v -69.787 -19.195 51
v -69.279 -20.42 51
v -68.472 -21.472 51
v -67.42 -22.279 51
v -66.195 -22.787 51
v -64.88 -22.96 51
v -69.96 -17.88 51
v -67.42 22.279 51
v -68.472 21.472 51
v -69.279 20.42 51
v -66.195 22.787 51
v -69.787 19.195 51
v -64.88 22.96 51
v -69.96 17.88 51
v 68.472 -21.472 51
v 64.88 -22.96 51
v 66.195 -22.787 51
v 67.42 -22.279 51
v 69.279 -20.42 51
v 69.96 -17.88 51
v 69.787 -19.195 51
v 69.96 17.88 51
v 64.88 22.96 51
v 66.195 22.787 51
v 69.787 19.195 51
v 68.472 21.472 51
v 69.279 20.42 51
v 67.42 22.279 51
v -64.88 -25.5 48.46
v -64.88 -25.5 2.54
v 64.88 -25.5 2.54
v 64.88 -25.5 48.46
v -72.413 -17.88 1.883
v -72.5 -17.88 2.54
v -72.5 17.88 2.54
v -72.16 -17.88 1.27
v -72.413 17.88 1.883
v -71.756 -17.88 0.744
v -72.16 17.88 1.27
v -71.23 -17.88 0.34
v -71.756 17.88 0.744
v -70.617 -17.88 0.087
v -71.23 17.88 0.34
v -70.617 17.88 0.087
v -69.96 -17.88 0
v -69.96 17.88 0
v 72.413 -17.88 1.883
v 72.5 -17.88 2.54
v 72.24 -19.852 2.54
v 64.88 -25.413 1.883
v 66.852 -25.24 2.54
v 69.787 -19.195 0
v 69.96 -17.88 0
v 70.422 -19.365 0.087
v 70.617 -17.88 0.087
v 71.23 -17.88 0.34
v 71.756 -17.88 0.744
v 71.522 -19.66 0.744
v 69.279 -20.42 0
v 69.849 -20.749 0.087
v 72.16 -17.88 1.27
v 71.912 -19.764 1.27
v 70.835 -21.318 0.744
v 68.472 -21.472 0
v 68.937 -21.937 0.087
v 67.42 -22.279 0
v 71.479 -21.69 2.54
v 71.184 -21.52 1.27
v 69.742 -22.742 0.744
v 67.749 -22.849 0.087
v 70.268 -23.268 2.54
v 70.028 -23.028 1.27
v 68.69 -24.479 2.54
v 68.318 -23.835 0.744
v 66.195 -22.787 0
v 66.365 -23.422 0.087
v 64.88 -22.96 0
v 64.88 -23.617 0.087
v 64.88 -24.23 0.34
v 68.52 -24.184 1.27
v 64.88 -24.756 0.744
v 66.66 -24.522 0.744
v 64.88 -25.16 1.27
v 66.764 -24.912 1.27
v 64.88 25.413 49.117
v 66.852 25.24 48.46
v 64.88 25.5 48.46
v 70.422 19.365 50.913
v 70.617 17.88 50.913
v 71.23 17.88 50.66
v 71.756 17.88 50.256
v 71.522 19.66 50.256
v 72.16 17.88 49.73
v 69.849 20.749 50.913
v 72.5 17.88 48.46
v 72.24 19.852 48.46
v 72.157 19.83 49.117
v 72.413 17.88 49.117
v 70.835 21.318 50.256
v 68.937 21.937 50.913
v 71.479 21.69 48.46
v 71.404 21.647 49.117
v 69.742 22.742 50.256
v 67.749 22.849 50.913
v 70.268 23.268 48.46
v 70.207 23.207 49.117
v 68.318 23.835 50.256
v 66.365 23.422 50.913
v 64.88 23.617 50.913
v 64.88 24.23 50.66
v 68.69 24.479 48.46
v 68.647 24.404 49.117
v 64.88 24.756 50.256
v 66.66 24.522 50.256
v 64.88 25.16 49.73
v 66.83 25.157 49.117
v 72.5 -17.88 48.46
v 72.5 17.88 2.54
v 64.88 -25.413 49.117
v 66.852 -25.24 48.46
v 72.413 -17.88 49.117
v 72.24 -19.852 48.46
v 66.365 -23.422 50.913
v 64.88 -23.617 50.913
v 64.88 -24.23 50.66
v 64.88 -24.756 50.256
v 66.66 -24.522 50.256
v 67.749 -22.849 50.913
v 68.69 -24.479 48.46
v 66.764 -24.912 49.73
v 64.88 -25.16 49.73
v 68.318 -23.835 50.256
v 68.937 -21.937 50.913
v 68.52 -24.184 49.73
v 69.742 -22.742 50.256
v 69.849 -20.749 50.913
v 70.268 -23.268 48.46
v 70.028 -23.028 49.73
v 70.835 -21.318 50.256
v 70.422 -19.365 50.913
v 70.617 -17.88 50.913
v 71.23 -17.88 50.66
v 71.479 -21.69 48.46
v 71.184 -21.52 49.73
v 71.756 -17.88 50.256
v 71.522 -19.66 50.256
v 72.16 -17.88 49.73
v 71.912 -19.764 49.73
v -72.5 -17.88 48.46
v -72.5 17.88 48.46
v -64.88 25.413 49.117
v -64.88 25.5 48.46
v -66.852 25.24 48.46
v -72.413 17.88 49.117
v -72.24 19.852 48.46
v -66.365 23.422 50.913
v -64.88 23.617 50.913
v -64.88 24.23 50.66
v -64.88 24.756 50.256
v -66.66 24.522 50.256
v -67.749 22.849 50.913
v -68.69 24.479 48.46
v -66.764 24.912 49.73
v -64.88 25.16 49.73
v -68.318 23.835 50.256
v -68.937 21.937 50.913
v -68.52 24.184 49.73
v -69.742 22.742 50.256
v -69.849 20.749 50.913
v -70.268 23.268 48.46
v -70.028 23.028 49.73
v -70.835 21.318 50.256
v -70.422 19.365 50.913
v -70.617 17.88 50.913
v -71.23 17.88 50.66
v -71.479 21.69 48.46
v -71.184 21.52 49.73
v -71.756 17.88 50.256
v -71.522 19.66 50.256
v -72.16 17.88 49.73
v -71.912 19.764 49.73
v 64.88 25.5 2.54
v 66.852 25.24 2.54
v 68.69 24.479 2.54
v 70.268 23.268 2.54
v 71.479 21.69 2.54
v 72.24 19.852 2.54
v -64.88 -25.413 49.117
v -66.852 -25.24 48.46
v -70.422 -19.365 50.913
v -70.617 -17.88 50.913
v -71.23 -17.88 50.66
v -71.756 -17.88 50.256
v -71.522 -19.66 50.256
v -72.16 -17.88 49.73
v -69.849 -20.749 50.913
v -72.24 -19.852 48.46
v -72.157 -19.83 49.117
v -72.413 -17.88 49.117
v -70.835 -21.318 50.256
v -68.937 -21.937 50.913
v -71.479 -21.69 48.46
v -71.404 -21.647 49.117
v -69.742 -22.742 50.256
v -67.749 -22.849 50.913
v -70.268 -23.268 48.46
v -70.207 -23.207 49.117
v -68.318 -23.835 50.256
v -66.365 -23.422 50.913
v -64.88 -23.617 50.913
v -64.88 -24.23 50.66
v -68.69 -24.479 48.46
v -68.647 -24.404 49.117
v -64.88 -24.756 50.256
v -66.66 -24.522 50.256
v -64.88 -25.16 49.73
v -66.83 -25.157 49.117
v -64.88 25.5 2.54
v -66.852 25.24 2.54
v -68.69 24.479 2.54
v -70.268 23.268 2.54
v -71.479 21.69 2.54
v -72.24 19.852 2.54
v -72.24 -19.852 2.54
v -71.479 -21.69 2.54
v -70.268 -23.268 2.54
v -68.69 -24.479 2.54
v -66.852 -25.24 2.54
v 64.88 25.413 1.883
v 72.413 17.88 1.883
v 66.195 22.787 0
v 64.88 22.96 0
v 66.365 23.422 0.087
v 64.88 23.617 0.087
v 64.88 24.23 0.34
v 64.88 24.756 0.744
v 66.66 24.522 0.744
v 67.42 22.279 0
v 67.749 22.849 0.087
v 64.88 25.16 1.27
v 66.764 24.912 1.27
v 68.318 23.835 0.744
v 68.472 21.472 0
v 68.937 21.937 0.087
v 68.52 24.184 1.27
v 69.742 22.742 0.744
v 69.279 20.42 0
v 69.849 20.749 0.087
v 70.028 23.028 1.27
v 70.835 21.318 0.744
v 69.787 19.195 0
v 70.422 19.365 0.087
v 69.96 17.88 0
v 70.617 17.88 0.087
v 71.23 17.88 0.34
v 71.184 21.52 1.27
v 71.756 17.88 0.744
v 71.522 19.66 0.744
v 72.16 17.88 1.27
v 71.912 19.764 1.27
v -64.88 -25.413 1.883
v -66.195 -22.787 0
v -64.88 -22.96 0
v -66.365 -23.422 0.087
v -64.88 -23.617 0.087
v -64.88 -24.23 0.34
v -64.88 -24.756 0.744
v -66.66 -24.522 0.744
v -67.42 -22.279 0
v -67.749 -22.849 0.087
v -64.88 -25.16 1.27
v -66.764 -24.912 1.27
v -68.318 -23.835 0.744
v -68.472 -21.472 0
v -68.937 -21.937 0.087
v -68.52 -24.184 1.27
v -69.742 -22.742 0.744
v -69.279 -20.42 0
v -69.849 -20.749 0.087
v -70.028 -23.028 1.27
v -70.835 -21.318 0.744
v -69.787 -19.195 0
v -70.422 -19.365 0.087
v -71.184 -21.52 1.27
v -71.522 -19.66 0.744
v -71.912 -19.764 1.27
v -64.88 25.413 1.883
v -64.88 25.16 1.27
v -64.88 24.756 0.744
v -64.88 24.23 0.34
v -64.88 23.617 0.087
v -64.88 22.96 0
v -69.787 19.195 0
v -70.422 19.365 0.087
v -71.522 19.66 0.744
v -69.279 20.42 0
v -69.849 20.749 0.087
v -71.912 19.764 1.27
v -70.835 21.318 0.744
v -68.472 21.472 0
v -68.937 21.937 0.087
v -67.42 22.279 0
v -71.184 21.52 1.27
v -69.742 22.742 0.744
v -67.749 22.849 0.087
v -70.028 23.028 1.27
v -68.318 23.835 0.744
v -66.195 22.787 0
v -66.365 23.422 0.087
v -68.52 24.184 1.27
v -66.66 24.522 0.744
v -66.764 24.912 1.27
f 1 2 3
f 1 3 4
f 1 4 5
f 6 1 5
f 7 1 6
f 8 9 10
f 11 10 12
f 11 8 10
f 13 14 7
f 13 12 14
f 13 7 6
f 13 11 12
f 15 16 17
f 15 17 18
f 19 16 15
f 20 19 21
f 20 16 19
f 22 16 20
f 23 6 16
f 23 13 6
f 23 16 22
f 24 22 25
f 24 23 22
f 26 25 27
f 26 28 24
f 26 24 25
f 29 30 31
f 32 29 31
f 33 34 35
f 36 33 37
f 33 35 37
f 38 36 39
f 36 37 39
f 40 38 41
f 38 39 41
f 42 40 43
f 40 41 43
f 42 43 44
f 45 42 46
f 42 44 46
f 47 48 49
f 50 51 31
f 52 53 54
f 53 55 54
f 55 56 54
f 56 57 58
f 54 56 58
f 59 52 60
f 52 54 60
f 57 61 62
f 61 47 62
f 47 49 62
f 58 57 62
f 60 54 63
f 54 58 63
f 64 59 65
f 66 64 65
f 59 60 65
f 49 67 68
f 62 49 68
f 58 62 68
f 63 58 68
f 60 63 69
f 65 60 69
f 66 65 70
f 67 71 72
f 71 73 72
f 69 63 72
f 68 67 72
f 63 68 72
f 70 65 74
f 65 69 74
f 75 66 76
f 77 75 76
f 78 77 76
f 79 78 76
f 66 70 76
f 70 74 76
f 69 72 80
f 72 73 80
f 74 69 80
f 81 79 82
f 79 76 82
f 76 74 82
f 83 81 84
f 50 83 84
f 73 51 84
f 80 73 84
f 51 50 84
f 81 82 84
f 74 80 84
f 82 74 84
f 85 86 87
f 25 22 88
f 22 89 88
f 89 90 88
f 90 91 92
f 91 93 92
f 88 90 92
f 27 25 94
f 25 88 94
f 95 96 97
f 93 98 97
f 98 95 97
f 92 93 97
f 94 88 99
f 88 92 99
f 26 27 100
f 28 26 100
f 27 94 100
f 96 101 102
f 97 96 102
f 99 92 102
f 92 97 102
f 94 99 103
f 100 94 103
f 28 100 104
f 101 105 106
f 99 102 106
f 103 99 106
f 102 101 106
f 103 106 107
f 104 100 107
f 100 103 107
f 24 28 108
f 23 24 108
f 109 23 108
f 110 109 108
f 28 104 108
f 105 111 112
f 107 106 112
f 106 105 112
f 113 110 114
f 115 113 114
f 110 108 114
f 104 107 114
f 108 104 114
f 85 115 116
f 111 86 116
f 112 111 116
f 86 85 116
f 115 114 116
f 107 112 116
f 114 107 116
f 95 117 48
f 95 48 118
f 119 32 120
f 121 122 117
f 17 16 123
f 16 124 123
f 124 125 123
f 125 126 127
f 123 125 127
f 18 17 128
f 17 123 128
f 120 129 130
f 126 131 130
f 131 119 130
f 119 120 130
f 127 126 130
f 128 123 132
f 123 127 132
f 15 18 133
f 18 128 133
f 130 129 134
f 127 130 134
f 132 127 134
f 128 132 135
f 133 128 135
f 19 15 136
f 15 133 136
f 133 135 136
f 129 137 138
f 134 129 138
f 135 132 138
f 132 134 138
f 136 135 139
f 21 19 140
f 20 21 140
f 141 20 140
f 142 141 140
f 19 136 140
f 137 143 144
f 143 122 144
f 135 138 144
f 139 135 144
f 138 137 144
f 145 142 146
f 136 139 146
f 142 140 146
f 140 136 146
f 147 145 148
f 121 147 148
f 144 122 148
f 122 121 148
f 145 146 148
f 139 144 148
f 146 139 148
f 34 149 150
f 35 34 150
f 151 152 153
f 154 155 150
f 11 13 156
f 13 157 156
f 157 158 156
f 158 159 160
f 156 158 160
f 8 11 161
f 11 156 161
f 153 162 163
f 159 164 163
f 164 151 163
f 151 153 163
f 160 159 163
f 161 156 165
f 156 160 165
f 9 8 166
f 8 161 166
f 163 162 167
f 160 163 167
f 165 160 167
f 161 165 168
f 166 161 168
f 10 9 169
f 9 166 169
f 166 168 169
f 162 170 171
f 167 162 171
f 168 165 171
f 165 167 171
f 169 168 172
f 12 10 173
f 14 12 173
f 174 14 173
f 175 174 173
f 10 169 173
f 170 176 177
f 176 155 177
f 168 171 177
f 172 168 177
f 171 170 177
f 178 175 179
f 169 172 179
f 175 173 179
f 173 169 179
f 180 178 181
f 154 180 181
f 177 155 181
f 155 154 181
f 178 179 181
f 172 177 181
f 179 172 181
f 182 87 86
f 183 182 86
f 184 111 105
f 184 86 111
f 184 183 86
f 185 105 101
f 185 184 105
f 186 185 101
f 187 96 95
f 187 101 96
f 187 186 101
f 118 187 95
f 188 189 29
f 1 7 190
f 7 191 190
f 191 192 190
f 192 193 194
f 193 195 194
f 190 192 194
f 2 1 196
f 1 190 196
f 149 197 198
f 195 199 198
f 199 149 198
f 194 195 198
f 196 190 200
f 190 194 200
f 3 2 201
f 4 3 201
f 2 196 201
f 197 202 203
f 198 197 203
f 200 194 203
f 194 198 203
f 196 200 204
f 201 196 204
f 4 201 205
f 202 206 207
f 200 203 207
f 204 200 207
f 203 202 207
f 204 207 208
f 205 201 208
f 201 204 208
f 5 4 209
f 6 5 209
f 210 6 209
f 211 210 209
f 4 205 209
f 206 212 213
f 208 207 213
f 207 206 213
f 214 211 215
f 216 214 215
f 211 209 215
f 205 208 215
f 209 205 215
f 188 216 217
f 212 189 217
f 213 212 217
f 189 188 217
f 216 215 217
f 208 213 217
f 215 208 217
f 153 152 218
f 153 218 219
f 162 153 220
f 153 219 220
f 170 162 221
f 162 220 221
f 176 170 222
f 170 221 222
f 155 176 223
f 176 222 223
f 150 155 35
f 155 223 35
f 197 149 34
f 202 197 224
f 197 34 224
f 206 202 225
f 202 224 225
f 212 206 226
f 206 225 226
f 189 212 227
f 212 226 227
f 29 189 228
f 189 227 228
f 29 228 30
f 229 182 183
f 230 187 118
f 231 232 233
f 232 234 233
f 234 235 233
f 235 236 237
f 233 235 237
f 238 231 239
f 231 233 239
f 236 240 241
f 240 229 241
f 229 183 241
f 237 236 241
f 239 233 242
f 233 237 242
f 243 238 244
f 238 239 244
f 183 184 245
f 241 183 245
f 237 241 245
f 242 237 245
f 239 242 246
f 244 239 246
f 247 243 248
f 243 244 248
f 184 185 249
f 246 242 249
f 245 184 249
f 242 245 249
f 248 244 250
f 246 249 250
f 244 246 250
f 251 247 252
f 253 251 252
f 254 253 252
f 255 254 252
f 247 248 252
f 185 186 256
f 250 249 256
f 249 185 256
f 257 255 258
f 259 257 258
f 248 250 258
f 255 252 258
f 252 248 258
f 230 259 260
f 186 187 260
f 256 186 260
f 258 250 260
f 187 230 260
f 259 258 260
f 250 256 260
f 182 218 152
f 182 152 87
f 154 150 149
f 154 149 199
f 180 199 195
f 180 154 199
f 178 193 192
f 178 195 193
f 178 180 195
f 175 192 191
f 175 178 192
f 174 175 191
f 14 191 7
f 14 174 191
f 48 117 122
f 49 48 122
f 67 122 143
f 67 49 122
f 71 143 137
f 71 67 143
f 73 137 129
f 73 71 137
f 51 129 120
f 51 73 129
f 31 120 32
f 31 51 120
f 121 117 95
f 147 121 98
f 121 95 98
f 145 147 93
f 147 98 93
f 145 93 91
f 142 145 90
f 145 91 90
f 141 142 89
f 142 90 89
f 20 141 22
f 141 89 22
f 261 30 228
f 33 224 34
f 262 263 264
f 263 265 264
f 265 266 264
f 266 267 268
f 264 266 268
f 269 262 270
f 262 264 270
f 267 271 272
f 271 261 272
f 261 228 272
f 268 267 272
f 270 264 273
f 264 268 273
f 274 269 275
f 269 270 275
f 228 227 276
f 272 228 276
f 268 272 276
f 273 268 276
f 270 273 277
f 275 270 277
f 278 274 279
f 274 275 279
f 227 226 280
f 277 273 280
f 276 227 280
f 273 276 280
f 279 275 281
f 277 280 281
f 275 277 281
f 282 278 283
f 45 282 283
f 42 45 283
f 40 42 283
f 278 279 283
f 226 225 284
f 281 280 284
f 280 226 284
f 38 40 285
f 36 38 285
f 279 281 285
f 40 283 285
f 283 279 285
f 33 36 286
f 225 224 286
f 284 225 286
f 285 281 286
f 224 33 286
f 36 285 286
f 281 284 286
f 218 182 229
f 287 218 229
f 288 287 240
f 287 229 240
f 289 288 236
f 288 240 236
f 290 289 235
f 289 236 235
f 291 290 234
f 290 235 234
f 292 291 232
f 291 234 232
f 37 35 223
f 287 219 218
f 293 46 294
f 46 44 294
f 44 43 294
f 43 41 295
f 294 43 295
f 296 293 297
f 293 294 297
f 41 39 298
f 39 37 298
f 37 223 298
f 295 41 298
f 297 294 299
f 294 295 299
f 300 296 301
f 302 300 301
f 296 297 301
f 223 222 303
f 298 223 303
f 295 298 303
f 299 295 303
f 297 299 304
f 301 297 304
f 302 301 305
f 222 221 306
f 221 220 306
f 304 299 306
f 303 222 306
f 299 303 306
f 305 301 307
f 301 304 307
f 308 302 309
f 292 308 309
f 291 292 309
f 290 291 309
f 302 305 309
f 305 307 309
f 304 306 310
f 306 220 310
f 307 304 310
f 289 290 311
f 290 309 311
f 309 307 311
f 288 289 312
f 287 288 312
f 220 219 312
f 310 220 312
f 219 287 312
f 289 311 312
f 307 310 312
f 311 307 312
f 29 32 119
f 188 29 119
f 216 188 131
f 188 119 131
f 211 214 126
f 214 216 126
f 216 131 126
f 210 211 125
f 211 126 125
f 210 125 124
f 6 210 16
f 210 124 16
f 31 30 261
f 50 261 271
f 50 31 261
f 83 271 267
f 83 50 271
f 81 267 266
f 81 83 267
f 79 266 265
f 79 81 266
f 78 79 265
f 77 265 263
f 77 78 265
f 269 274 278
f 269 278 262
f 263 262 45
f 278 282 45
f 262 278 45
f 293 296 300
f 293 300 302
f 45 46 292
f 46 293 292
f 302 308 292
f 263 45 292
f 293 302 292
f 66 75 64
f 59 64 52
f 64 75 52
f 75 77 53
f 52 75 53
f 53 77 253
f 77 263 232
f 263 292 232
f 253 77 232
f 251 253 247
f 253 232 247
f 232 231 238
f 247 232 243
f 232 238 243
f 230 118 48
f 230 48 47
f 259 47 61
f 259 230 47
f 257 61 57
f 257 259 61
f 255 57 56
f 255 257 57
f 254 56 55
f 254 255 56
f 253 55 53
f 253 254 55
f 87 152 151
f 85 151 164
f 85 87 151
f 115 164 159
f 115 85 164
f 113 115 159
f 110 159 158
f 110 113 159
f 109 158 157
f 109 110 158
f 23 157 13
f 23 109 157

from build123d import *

# Parameters (mm, degrees)
F0_W         = 145
F0_H         = 51
F1_DEPTH     = 51
F2_R         = 2.54
F3_T1_DEPTH  = 51
F3_T4_ANGLE  = 90
F3_T6_ANGLE  = 90
F3_T8_ANGLE  = 90
F3_T10_ANGLE = 90
F3_T12_ANGLE = 90
F3_T14_ANGLE = 90
F3_T16_ANGLE = 90
F3_T18_ANGLE = 90


# Not quite as in the source:
# - a fillet or chamfer that OpenCascade refuses, or shapes differently, is made with other operations: its cross-section is extruded or revolved along the edge and cut away or added


with BuildPart() as f1:
    # F0 (on Top) → F1 (new body)
    with BuildSketch(Plane.XY):
        Rectangle(F0_W, F0_H)
    extrude(amount=F1_DEPTH)

    # F2
    f2_edges = [f1.edges().sort_by_distance(p)[0] for p in [
        (0, -25.5, 51),
        (0, 25.5, 51),
        (0, -25.5, 0),
        (0, 25.5, 0),
        (-72.5, 0, 0),
        (-72.5, 0, 51),
        (72.5, 0, 0),
        (72.5, 0, 51),
    ]]
    fillet(f2_edges, radius=F2_R)

    # F3: fillet of radius 7.62 on 4 edges, made by hand

    # F3_s2 → F3_t1 (cut)
    with BuildSketch(Plane.XY):
        with BuildLine():
            ThreePointArc((72.5, -17.88), (70.2681536726, -23.2681536726), (64.88, -25.5))
            Line((64.88, -25.5), (72.5, -25.5))
            Line((72.5, -25.5), (72.5, -17.88))
        make_face()
        with BuildLine():
            ThreePointArc((64.88, 25.5), (70.2681536726, 23.2681536726), (72.5, 17.88))
            Line((72.5, 17.88), (72.5, 25.5))
            Line((72.5, 25.5), (64.88, 25.5))
        make_face()
        with BuildLine():
            ThreePointArc((-72.5, -17.88), (-70.2681536726, -23.2681536726), (-64.88, -25.5))
            Line((-64.88, -25.5), (-72.5, -25.5))
            Line((-72.5, -25.5), (-72.5, -17.88))
        make_face()
        with BuildLine():
            ThreePointArc((-64.88, 25.5), (-70.2681536726, 23.2681536726), (-72.5, 17.88))
            Line((-72.5, 17.88), (-72.5, 25.5))
            Line((-72.5, 25.5), (-64.88, 25.5))
        make_face()
    extrude(amount=F3_T1_DEPTH, mode=Mode.SUBTRACT)

    # F3_s3 → F3_t4 (revolve, cut)
    with BuildSketch(Plane.XZ.offset(-17.88)):
        with BuildLine():
            ThreePointArc((-69.96, 0), (-71.7560512242, 0.7439487758), (-72.5, 2.54))
            Line((-72.5, 2.54), (-72.5, 0))
            Line((-72.5, 0), (-69.96, 0))
        make_face()
    revolve(axis=Axis((-64.88, 17.88, 0), (0, 0, -1)), revolution_arc=F3_T4_ANGLE, mode=Mode.SUBTRACT)

    # F3_s5 → F3_t6 (revolve, cut)
    with BuildSketch(Plane.YZ.offset(-64.88)):
        with BuildLine():
            ThreePointArc((22.96, 51), (24.7560512242, 50.2560512242), (25.5, 48.46))
            Line((25.5, 48.46), (25.5, 51))
            Line((25.5, 51), (22.96, 51))
        make_face()
    revolve(axis=Axis((-64.88, 17.88, 51), (0, 0, 1)), revolution_arc=F3_T6_ANGLE, mode=Mode.SUBTRACT)

    # F3_s7 → F3_t8 (revolve, cut)
    with BuildSketch(Plane.YZ.offset(-64.88)):
        with BuildLine():
            ThreePointArc((-22.96, 0), (-24.7560512242, 0.7439487758), (-25.5, 2.54))
            Line((-25.5, 2.54), (-25.5, 0))
            Line((-25.5, 0), (-22.96, 0))
        make_face()
    revolve(axis=Axis((-64.88, -17.88, 0), (0, 0, -1)), revolution_arc=F3_T8_ANGLE, mode=Mode.SUBTRACT)

    # F3_s9 → F3_t10 (revolve, cut)
    with BuildSketch(Plane.XZ.offset(17.88)):
        with BuildLine():
            ThreePointArc((-69.96, 51), (-71.7560512242, 50.2560512242), (-72.5, 48.46))
            Line((-72.5, 48.46), (-72.5, 51))
            Line((-72.5, 51), (-69.96, 51))
        make_face()
    revolve(axis=Axis((-64.88, -17.88, 51), (0, 0, 1)), revolution_arc=F3_T10_ANGLE, mode=Mode.SUBTRACT)

    # F3_s11 → F3_t12 (revolve, cut)
    with BuildSketch(Plane.YZ.offset(64.88)):
        with BuildLine():
            ThreePointArc((22.96, 0), (24.7560512242, 0.7439487758), (25.5, 2.54))
            Line((25.5, 2.54), (25.5, 0))
            Line((25.5, 0), (22.96, 0))
        make_face()
    revolve(axis=Axis((64.88, 17.88, 0), (0, 0, -1)), revolution_arc=F3_T12_ANGLE, mode=Mode.SUBTRACT)

    # F3_s13 → F3_t14 (revolve, cut)
    with BuildSketch(Plane.XZ.offset(-17.88)):
        with BuildLine():
            ThreePointArc((69.96, 51), (71.7560512242, 50.2560512242), (72.5, 48.46))
            Line((72.5, 48.46), (72.5, 51))
            Line((72.5, 51), (69.96, 51))
        make_face()
    revolve(axis=Axis((64.88, 17.88, 51), (0, 0, 1)), revolution_arc=F3_T14_ANGLE, mode=Mode.SUBTRACT)

    # F3_s15 → F3_t16 (revolve, cut)
    with BuildSketch(Plane.XZ.offset(17.88)):
        with BuildLine():
            ThreePointArc((69.96, 0), (71.7560512242, 0.7439487758), (72.5, 2.54))
            Line((72.5, 2.54), (72.5, 0))
            Line((72.5, 0), (69.96, 0))
        make_face()
    revolve(axis=Axis((64.88, -17.88, 0), (0, 0, -1)), revolution_arc=F3_T16_ANGLE, mode=Mode.SUBTRACT)

    # F3_s17 → F3_t18 (revolve, cut)
    with BuildSketch(Plane.YZ.offset(64.88)):
        with BuildLine():
            ThreePointArc((-22.96, 51), (-24.7560512242, 50.2560512242), (-25.5, 48.46))
            Line((-25.5, 48.46), (-25.5, 51))
            Line((-25.5, 51), (-22.96, 51))
        make_face()
    revolve(axis=Axis((64.88, -17.88, 51), (0, 0, 1)), revolution_arc=F3_T18_ANGLE, mode=Mode.SUBTRACT)


solid = f1.part
